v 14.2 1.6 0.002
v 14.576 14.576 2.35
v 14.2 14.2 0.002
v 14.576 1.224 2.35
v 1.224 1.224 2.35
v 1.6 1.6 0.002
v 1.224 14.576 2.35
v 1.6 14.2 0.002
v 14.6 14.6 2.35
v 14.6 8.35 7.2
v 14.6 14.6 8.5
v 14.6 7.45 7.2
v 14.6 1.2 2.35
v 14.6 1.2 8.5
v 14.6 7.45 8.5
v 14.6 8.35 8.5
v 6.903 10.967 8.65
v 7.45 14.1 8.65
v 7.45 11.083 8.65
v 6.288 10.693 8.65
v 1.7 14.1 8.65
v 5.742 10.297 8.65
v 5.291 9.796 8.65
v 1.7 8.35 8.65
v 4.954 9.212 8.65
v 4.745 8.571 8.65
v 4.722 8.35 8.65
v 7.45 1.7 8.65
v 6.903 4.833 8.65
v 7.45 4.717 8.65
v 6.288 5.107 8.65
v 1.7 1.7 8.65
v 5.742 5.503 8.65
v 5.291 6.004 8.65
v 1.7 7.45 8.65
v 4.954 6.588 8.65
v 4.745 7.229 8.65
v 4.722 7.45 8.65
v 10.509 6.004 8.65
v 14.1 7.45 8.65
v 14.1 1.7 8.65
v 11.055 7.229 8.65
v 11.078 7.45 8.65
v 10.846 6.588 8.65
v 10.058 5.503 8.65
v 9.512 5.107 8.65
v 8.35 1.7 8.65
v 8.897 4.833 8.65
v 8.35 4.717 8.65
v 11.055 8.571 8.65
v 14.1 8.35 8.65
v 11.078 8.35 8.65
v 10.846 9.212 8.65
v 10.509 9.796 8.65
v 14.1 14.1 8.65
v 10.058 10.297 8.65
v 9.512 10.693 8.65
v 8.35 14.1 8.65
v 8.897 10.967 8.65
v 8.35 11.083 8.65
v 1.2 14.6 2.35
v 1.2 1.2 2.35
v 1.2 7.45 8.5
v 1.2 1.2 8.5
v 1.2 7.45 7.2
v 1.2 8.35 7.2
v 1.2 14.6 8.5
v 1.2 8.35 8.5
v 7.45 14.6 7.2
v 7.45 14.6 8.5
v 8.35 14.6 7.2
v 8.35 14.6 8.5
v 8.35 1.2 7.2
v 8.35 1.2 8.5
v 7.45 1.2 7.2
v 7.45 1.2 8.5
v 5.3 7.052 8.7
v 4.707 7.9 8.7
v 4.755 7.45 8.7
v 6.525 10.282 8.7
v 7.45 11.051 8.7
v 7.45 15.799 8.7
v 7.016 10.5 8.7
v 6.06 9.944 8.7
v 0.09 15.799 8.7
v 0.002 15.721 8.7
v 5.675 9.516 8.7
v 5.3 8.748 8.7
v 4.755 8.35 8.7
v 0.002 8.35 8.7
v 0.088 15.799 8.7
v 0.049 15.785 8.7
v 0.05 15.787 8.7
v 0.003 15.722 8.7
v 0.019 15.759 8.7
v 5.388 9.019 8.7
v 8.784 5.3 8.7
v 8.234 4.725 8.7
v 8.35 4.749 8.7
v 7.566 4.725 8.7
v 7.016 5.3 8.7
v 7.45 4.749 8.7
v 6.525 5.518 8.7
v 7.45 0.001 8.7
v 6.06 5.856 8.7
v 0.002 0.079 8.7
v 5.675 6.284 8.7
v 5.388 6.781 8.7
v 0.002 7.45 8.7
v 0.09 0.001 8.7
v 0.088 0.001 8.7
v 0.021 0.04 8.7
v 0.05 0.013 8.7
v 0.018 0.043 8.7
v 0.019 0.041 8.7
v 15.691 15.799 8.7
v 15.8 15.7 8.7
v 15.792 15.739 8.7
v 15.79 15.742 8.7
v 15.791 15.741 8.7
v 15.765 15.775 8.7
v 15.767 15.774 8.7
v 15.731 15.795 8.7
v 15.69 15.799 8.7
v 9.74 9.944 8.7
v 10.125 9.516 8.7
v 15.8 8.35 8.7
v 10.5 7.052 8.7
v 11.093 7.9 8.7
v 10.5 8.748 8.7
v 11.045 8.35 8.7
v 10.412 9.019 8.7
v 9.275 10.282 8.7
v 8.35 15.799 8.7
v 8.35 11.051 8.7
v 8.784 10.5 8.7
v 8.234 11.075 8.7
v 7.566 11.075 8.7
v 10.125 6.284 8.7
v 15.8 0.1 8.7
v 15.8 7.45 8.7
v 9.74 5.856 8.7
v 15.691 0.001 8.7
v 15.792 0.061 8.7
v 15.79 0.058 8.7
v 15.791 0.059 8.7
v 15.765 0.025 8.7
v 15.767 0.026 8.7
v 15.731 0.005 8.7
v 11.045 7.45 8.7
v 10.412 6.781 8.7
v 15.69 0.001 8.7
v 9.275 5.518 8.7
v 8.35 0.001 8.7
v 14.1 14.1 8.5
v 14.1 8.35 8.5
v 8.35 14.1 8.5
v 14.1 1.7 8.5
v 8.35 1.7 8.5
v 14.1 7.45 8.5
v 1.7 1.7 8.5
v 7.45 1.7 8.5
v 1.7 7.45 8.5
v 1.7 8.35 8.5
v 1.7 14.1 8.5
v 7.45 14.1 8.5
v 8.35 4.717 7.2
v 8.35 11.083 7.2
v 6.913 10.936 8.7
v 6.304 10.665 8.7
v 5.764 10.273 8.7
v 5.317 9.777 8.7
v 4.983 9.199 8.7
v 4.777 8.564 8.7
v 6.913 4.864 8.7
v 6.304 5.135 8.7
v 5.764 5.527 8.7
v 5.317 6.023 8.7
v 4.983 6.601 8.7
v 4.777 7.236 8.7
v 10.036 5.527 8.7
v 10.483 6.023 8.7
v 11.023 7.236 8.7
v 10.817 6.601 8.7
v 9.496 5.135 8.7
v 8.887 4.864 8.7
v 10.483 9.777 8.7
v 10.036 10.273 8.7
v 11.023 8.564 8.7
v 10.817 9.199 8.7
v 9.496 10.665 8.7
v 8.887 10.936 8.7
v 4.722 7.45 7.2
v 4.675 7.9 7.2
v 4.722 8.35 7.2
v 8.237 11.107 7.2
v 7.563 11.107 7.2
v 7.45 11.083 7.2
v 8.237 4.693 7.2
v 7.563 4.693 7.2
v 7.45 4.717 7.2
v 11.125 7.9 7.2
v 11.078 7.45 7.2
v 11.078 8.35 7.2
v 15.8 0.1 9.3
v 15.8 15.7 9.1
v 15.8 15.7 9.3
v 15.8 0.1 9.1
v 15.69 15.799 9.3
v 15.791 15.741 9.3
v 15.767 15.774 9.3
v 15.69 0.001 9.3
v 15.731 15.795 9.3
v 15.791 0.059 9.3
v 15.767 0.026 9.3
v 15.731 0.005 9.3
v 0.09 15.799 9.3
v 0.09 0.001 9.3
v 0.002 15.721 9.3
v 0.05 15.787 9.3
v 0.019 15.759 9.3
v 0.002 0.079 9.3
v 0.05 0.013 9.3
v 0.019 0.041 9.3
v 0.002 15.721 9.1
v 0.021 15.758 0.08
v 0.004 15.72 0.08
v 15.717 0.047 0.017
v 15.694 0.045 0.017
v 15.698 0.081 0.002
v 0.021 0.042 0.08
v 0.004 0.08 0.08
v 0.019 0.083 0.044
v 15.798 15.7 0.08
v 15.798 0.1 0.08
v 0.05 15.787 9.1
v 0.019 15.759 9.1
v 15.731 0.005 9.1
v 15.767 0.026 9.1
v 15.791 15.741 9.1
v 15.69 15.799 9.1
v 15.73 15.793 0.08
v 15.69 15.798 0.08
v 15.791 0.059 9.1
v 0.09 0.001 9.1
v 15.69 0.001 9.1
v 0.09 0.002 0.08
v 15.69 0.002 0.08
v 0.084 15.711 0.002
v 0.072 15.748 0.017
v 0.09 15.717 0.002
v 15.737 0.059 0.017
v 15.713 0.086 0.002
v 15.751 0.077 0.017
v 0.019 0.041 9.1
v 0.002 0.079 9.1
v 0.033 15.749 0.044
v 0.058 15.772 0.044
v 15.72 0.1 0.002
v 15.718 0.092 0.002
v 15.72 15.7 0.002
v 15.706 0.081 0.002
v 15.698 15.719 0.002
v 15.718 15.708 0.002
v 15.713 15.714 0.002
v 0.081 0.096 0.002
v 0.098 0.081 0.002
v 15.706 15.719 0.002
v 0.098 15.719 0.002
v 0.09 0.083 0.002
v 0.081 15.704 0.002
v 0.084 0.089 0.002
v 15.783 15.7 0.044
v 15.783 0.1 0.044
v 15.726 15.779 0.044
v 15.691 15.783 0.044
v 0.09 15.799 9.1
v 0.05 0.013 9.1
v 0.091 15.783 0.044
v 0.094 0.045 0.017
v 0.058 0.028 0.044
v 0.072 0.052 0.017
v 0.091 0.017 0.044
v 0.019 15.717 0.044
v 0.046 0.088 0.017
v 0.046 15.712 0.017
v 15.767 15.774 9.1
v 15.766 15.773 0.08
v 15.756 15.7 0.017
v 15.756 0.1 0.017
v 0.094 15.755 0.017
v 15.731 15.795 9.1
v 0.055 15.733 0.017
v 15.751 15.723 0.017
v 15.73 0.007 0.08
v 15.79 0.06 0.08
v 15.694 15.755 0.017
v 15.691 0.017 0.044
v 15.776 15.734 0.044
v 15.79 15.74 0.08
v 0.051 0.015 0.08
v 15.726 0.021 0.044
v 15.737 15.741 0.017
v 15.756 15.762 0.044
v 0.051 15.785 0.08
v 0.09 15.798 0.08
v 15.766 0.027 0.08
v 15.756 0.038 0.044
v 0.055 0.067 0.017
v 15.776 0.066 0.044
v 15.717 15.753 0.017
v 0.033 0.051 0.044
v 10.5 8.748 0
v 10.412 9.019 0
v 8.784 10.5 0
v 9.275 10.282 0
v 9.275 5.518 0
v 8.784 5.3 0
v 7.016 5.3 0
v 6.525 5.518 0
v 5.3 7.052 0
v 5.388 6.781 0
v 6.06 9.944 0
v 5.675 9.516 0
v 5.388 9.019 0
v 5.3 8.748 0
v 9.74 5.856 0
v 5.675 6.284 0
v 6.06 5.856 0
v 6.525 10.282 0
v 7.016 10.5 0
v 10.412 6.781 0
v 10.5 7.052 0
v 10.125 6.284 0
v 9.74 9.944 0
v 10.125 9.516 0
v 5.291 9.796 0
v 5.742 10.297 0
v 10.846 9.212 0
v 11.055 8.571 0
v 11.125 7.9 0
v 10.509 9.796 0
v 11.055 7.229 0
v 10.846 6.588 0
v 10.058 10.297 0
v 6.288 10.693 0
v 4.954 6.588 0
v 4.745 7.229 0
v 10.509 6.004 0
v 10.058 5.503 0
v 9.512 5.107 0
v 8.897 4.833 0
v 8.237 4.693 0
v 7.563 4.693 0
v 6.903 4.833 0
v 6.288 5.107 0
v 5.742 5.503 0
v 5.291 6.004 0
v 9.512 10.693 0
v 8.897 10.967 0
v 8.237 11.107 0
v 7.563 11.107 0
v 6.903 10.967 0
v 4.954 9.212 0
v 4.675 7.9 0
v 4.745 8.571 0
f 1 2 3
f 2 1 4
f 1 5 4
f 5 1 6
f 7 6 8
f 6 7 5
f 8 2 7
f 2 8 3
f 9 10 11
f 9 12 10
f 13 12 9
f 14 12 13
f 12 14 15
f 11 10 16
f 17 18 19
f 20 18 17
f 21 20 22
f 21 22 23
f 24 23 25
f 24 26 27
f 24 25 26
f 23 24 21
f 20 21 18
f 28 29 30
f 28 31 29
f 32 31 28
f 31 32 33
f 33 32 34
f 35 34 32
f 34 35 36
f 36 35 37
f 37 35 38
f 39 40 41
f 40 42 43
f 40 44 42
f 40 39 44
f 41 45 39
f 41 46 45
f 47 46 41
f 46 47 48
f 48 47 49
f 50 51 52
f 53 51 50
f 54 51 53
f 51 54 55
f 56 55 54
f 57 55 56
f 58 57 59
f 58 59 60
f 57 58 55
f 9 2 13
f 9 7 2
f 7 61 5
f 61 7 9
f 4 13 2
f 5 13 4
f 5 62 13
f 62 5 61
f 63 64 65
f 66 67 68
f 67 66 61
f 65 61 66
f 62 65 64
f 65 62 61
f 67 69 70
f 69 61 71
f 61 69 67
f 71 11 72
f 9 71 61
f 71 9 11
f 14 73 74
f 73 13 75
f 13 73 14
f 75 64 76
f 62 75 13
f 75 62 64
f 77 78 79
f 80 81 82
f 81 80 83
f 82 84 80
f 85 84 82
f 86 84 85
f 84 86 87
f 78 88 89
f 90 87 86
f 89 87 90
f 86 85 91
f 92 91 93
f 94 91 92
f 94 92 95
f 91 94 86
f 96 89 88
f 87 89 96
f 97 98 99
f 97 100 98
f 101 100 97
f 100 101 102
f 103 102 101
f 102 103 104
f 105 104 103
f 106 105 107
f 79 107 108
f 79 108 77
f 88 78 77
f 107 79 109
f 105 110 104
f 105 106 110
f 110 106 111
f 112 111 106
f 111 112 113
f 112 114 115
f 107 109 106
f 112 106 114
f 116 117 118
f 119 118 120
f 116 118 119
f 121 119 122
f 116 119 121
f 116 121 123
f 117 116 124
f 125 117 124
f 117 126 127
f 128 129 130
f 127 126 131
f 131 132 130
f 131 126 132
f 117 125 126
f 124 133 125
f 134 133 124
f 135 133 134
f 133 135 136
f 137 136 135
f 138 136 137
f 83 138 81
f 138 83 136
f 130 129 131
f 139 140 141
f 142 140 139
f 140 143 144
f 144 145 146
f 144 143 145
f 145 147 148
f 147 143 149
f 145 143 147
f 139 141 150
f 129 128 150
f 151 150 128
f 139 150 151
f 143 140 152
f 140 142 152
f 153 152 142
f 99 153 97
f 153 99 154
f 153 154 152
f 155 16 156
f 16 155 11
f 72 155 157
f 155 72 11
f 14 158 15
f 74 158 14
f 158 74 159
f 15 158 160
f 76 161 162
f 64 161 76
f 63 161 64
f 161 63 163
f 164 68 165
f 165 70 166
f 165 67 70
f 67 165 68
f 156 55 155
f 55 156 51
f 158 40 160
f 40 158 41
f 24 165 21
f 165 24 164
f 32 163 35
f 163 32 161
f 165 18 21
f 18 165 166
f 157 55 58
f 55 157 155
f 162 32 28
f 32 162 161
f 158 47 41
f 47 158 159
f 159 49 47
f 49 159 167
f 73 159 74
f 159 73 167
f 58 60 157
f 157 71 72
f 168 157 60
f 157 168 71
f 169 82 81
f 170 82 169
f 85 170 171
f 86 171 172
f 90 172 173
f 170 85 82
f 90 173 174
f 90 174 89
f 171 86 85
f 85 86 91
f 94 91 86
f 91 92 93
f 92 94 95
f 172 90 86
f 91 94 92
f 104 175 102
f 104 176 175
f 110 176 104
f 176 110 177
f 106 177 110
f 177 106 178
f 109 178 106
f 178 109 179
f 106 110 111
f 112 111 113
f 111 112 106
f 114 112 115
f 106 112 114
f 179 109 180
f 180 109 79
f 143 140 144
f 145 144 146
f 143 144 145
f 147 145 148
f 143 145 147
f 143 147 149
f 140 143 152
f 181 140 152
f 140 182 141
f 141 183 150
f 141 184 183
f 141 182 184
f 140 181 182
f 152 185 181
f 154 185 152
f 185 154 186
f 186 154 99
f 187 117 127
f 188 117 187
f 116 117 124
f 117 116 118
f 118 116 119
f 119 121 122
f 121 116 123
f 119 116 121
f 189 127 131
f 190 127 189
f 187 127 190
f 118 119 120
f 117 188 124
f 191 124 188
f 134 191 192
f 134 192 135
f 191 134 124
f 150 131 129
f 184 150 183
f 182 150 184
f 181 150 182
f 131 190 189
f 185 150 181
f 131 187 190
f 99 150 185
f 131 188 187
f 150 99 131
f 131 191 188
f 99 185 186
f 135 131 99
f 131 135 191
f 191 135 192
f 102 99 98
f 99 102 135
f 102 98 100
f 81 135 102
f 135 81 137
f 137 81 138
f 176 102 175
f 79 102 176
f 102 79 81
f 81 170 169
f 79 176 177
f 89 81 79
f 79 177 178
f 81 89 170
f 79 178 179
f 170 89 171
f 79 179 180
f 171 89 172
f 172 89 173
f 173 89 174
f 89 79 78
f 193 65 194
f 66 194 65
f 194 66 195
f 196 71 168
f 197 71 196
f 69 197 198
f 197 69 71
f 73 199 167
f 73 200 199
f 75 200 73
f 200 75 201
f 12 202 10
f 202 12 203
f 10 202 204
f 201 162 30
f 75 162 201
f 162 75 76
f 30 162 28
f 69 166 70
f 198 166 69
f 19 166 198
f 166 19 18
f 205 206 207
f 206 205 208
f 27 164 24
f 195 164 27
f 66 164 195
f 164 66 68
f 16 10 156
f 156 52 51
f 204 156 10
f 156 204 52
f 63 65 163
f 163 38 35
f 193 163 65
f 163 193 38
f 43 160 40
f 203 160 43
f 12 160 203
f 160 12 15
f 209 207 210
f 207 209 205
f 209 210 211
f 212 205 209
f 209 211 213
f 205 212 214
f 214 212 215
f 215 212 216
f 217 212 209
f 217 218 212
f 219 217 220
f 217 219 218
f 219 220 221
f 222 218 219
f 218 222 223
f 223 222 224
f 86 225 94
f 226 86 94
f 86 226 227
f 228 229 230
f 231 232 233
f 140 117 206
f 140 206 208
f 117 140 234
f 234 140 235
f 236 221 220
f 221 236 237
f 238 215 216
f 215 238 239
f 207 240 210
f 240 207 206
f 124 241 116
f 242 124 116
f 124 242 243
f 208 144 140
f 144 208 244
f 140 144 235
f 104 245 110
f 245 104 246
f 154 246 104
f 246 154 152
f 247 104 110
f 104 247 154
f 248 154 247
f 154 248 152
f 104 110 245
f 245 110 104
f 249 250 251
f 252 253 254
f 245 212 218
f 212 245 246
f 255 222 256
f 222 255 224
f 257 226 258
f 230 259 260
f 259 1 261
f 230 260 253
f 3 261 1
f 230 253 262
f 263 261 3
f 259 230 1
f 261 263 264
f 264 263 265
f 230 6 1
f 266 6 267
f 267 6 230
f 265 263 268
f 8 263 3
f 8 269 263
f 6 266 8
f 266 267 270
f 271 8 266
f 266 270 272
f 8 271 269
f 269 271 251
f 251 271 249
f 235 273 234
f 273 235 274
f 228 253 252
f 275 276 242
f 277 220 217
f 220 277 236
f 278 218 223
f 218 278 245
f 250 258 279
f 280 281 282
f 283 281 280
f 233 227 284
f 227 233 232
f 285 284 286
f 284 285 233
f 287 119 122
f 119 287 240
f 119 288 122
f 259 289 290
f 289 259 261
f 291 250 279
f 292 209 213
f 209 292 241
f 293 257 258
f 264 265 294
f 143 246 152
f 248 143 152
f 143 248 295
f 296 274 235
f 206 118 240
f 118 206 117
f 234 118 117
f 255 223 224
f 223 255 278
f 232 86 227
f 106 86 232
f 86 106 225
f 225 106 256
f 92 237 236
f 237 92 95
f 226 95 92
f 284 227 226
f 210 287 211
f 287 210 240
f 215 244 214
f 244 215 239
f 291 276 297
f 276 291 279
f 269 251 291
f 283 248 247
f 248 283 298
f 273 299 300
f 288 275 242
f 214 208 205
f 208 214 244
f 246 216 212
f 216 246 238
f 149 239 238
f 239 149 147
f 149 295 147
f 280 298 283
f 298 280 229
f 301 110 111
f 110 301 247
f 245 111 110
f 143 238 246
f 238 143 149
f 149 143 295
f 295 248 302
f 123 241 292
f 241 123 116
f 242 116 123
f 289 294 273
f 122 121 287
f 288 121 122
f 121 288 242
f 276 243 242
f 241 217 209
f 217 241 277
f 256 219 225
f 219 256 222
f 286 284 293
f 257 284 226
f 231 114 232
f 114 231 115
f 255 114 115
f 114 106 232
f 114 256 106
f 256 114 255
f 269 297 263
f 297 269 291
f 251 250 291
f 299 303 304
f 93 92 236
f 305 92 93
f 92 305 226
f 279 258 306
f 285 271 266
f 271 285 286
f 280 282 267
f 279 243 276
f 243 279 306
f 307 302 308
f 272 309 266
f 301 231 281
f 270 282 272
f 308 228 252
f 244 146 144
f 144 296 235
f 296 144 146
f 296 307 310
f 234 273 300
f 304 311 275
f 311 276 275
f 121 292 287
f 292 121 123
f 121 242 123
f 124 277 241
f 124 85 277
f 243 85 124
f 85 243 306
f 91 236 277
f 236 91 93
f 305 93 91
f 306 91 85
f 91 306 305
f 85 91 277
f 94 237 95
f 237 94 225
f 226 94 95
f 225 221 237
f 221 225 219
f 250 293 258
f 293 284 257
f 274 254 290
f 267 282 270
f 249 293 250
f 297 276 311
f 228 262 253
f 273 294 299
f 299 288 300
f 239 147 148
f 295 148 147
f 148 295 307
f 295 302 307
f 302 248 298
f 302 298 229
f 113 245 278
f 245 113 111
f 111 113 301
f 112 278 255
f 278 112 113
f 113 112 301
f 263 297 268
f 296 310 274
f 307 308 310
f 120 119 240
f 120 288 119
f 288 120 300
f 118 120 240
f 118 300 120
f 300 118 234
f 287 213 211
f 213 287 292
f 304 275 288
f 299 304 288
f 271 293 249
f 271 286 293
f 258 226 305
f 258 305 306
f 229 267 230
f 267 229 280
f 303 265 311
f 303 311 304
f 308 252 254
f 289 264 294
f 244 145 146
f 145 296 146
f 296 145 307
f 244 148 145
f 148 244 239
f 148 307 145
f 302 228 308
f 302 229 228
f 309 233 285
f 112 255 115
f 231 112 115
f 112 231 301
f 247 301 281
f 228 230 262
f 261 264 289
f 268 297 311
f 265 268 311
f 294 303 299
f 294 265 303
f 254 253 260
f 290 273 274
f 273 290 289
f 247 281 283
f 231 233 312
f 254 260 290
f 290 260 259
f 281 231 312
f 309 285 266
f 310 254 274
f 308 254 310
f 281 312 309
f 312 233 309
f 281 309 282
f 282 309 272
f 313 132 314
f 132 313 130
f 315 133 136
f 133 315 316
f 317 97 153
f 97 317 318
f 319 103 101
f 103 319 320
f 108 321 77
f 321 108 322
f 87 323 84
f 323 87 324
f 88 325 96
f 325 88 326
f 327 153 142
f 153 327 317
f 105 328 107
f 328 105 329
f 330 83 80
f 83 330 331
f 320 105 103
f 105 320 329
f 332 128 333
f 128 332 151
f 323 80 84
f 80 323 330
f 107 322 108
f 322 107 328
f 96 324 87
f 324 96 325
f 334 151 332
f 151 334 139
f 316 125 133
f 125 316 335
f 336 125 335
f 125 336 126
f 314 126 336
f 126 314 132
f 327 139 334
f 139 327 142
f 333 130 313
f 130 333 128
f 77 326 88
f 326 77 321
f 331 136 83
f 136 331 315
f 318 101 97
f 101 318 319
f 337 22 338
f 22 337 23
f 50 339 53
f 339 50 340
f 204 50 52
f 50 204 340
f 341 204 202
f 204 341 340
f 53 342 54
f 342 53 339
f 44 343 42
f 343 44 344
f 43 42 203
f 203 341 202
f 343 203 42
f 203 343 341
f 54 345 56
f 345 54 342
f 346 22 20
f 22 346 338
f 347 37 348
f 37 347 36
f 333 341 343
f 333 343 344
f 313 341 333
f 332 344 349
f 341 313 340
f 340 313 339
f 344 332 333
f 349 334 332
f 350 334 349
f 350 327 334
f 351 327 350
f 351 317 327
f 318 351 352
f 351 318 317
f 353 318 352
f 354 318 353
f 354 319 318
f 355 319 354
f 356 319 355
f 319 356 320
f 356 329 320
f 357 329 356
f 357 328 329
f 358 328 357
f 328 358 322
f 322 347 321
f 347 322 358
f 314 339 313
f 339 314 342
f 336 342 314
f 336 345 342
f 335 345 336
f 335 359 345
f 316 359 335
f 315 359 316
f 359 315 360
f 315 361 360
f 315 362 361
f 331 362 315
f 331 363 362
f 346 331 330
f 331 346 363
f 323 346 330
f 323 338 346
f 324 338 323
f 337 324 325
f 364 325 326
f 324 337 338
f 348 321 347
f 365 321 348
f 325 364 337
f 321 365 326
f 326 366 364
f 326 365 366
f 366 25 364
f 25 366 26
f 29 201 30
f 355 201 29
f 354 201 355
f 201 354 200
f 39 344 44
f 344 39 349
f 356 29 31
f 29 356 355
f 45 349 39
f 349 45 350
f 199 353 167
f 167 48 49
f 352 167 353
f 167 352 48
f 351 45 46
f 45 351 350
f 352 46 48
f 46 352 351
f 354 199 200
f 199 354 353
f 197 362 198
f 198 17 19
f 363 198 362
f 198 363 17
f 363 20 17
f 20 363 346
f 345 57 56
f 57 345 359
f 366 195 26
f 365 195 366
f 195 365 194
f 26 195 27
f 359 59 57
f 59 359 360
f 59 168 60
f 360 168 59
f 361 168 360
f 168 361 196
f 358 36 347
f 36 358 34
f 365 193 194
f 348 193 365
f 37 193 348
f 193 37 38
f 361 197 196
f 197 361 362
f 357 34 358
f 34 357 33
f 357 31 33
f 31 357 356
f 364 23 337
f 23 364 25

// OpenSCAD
// file: ../../lib/brick-hollow.scad
/**
* Machine Blocks
* https://machinemania.net/blocks 
*
* Brick Hollow
* Copyright (c) 2022 Jan Philipp Knoeller <pk@pksoftware.de>
*
* Published under license:
* Creative Commons Attribution-NonCommercial-ShareAlike 4.0 International 
* https://creativecommons.org/licenses/by-nc-sa/4.0/
*
*/
echo(version=version());

module brickHollow(height=9.3, fade=2.5, minSize=[4.6,4.6], maxSize=[5.2, 5.2], center = false){
    echo(height, minSize, maxSize, fade);
    sizeX = max(minSize[0],maxSize[0]); 
   sizeY = max(minSize[1],maxSize[1]); 
    
    posX = center ? 0 : 0.5*sizeX; 
   posY = center ? 0 : 0.5*sizeY;   
   posZ = center ? -0.5 * (height-fade) : 0.5*fade;
    
    cutHelper = 0.2;
    overlapSpace=0.1;
    
    translate([posX, posY, posZ]){
        union(){
            polyhedron(points=[
                [-0.5*minSize[0],-0.5*minSize[1],-0.5*fade],
                [0.5*minSize[0],-0.5*minSize[1],-0.5*fade],
                [0.5*minSize[0],0.5*minSize[1],-0.5*fade],
                [-0.5*minSize[0],0.5*minSize[1],-0.5*fade],
                [-0.5*maxSize[0],-0.5*maxSize[1],0.5*fade],
                [0.5*maxSize[0],-0.5*maxSize[1],0.5*fade],
                [0.5*maxSize[0],0.5*maxSize[1],0.5*fade],
                [-0.5*maxSize[0],0.5*maxSize[1],0.5*fade]
            ], faces=[[0,1,2,3],[1,0,4,5],[2,1,5,6],[3,2,6,7],[0,3,7,4],[7,6,5,4]]);
            
            if(height > fade){
                translate([0,0,0.5*height - overlapSpace]){
                    cube([maxSize[0], maxSize[1], height - fade + overlapSpace], center=true);
                }
            }
            
            translate([0,0,-0.5*(fade + cutHelper) + overlapSpace]){
                cube([minSize[0], minSize[1], cutHelper + overlapSpace], center=true);
            }
        }
    }
}

//brickHollow(height=9.3, maxSize=[5.2,5.2], minSize=[4.6,4.6], center=true);
// file: ../../lib/roundedcube_simple.scad
/**
* Machine Blocks
* https://machinemania.net/blocks 
*
* Module for simple rounded cubes
* Copyright (c) 2022 Jan Philipp Knoeller <pk@pksoftware.de>
*
* Published under license:
* Creative Commons Attribution-NonCommercial-ShareAlike 4.0 International 
* https://creativecommons.org/licenses/by-nc-sa/4.0/
*
*/
module roundedcube_simple(size = [1, 1, 1], center = false, radius = 0.5, resolution = 20) {
	// If single value, convert to [x, y, z] vector
	size = (size[0] == undef) ? [size, size, size] : size;

	translate = (center == false) ?
		[radius, radius, radius] :
		[
			radius - (size[0] / 2),
			radius - (size[1] / 2),
			radius - (size[2] / 2)
	];

	translate(v = translate)
	minkowski() {
		cube(size = [
			size[0] - (radius * 2),
			size[1] - (radius * 2),
			size[2] - (radius * 2)
		]);
		sphere(r = radius, $fn = resolution);
	}
}
// file: ../../lib/roundedcube.scad
// More information: https://danielupshaw.com/openscad-rounded-corners/

// Set to 0.01 for higher definition curves (renders slower)
$fs = 0.15;

module roundedcube(size = [1, 1, 1], center = false, radius = 0.5, apply_to = "all", resolution = 20) {
	// If single value, convert to [x, y, z] vector
	size = (size[0] == undef) ? [size, size, size] : size;

	translate_min = radius;
	translate_xmax = size[0] - radius;
	translate_ymax = size[1] - radius;
	translate_zmax = size[2] - radius;

	diameter = radius * 2;

	obj_translate = (center == false) ?
		[0, 0, 0] : [
			-(size[0] / 2),
			-(size[1] / 2),
			-(size[2] / 2)
		];

	translate(v = obj_translate) {
		hull() {
			for (translate_x = [translate_min, translate_xmax]) {
				x_at = (translate_x == translate_min) ? "min" : "max";
				for (translate_y = [translate_min, translate_ymax]) {
					y_at = (translate_y == translate_min) ? "min" : "max";
					for (translate_z = [translate_min, translate_zmax]) {
						z_at = (translate_z == translate_min) ? "min" : "max";

						translate(v = [translate_x, translate_y, translate_z])
						if (
							(apply_to == "all") ||
							(apply_to == "xmin" && x_at == "min") || (apply_to == "xmax" && x_at == "max") ||
							(apply_to == "ymin" && y_at == "min") || (apply_to == "ymax" && y_at == "max") ||
							(apply_to == "zmin" && z_at == "min") || (apply_to == "zmax" && z_at == "max")
						) {
							sphere(r = radius, $fn = resolution);
						} else {
							rotate = 
								(apply_to == "xmin" || apply_to == "xmax" || apply_to == "x") ? [0, 90, 0] : (
								(apply_to == "ymin" || apply_to == "ymax" || apply_to == "y") ? [90, 90, 0] :
								[0, 0, 0]
							);
							rotate(a = rotate)
							cylinder(h = diameter, r = radius, center = true, $fn = resolution);
						}
					}
				}
			}
		}
	}
}
// main file
/**
* Machine Blocks
* https://machinemania.net/blocks 
*
* Brick 2x2 without knobs
* Copyright (c) 2022 Jan Philipp Knoeller <pk@pksoftware.de>
*
* Published under license:
* Creative Commons Attribution-NonCommercial-ShareAlike 4.0 International 
* https://creativecommons.org/licenses/by-nc-sa/4.0/
*
*/
echo(version=version());

include <../../lib/block-v2.scad>;

//2x2 Brick    
block(baseLayers=3, grid=[2,2], withKnobs=false);
